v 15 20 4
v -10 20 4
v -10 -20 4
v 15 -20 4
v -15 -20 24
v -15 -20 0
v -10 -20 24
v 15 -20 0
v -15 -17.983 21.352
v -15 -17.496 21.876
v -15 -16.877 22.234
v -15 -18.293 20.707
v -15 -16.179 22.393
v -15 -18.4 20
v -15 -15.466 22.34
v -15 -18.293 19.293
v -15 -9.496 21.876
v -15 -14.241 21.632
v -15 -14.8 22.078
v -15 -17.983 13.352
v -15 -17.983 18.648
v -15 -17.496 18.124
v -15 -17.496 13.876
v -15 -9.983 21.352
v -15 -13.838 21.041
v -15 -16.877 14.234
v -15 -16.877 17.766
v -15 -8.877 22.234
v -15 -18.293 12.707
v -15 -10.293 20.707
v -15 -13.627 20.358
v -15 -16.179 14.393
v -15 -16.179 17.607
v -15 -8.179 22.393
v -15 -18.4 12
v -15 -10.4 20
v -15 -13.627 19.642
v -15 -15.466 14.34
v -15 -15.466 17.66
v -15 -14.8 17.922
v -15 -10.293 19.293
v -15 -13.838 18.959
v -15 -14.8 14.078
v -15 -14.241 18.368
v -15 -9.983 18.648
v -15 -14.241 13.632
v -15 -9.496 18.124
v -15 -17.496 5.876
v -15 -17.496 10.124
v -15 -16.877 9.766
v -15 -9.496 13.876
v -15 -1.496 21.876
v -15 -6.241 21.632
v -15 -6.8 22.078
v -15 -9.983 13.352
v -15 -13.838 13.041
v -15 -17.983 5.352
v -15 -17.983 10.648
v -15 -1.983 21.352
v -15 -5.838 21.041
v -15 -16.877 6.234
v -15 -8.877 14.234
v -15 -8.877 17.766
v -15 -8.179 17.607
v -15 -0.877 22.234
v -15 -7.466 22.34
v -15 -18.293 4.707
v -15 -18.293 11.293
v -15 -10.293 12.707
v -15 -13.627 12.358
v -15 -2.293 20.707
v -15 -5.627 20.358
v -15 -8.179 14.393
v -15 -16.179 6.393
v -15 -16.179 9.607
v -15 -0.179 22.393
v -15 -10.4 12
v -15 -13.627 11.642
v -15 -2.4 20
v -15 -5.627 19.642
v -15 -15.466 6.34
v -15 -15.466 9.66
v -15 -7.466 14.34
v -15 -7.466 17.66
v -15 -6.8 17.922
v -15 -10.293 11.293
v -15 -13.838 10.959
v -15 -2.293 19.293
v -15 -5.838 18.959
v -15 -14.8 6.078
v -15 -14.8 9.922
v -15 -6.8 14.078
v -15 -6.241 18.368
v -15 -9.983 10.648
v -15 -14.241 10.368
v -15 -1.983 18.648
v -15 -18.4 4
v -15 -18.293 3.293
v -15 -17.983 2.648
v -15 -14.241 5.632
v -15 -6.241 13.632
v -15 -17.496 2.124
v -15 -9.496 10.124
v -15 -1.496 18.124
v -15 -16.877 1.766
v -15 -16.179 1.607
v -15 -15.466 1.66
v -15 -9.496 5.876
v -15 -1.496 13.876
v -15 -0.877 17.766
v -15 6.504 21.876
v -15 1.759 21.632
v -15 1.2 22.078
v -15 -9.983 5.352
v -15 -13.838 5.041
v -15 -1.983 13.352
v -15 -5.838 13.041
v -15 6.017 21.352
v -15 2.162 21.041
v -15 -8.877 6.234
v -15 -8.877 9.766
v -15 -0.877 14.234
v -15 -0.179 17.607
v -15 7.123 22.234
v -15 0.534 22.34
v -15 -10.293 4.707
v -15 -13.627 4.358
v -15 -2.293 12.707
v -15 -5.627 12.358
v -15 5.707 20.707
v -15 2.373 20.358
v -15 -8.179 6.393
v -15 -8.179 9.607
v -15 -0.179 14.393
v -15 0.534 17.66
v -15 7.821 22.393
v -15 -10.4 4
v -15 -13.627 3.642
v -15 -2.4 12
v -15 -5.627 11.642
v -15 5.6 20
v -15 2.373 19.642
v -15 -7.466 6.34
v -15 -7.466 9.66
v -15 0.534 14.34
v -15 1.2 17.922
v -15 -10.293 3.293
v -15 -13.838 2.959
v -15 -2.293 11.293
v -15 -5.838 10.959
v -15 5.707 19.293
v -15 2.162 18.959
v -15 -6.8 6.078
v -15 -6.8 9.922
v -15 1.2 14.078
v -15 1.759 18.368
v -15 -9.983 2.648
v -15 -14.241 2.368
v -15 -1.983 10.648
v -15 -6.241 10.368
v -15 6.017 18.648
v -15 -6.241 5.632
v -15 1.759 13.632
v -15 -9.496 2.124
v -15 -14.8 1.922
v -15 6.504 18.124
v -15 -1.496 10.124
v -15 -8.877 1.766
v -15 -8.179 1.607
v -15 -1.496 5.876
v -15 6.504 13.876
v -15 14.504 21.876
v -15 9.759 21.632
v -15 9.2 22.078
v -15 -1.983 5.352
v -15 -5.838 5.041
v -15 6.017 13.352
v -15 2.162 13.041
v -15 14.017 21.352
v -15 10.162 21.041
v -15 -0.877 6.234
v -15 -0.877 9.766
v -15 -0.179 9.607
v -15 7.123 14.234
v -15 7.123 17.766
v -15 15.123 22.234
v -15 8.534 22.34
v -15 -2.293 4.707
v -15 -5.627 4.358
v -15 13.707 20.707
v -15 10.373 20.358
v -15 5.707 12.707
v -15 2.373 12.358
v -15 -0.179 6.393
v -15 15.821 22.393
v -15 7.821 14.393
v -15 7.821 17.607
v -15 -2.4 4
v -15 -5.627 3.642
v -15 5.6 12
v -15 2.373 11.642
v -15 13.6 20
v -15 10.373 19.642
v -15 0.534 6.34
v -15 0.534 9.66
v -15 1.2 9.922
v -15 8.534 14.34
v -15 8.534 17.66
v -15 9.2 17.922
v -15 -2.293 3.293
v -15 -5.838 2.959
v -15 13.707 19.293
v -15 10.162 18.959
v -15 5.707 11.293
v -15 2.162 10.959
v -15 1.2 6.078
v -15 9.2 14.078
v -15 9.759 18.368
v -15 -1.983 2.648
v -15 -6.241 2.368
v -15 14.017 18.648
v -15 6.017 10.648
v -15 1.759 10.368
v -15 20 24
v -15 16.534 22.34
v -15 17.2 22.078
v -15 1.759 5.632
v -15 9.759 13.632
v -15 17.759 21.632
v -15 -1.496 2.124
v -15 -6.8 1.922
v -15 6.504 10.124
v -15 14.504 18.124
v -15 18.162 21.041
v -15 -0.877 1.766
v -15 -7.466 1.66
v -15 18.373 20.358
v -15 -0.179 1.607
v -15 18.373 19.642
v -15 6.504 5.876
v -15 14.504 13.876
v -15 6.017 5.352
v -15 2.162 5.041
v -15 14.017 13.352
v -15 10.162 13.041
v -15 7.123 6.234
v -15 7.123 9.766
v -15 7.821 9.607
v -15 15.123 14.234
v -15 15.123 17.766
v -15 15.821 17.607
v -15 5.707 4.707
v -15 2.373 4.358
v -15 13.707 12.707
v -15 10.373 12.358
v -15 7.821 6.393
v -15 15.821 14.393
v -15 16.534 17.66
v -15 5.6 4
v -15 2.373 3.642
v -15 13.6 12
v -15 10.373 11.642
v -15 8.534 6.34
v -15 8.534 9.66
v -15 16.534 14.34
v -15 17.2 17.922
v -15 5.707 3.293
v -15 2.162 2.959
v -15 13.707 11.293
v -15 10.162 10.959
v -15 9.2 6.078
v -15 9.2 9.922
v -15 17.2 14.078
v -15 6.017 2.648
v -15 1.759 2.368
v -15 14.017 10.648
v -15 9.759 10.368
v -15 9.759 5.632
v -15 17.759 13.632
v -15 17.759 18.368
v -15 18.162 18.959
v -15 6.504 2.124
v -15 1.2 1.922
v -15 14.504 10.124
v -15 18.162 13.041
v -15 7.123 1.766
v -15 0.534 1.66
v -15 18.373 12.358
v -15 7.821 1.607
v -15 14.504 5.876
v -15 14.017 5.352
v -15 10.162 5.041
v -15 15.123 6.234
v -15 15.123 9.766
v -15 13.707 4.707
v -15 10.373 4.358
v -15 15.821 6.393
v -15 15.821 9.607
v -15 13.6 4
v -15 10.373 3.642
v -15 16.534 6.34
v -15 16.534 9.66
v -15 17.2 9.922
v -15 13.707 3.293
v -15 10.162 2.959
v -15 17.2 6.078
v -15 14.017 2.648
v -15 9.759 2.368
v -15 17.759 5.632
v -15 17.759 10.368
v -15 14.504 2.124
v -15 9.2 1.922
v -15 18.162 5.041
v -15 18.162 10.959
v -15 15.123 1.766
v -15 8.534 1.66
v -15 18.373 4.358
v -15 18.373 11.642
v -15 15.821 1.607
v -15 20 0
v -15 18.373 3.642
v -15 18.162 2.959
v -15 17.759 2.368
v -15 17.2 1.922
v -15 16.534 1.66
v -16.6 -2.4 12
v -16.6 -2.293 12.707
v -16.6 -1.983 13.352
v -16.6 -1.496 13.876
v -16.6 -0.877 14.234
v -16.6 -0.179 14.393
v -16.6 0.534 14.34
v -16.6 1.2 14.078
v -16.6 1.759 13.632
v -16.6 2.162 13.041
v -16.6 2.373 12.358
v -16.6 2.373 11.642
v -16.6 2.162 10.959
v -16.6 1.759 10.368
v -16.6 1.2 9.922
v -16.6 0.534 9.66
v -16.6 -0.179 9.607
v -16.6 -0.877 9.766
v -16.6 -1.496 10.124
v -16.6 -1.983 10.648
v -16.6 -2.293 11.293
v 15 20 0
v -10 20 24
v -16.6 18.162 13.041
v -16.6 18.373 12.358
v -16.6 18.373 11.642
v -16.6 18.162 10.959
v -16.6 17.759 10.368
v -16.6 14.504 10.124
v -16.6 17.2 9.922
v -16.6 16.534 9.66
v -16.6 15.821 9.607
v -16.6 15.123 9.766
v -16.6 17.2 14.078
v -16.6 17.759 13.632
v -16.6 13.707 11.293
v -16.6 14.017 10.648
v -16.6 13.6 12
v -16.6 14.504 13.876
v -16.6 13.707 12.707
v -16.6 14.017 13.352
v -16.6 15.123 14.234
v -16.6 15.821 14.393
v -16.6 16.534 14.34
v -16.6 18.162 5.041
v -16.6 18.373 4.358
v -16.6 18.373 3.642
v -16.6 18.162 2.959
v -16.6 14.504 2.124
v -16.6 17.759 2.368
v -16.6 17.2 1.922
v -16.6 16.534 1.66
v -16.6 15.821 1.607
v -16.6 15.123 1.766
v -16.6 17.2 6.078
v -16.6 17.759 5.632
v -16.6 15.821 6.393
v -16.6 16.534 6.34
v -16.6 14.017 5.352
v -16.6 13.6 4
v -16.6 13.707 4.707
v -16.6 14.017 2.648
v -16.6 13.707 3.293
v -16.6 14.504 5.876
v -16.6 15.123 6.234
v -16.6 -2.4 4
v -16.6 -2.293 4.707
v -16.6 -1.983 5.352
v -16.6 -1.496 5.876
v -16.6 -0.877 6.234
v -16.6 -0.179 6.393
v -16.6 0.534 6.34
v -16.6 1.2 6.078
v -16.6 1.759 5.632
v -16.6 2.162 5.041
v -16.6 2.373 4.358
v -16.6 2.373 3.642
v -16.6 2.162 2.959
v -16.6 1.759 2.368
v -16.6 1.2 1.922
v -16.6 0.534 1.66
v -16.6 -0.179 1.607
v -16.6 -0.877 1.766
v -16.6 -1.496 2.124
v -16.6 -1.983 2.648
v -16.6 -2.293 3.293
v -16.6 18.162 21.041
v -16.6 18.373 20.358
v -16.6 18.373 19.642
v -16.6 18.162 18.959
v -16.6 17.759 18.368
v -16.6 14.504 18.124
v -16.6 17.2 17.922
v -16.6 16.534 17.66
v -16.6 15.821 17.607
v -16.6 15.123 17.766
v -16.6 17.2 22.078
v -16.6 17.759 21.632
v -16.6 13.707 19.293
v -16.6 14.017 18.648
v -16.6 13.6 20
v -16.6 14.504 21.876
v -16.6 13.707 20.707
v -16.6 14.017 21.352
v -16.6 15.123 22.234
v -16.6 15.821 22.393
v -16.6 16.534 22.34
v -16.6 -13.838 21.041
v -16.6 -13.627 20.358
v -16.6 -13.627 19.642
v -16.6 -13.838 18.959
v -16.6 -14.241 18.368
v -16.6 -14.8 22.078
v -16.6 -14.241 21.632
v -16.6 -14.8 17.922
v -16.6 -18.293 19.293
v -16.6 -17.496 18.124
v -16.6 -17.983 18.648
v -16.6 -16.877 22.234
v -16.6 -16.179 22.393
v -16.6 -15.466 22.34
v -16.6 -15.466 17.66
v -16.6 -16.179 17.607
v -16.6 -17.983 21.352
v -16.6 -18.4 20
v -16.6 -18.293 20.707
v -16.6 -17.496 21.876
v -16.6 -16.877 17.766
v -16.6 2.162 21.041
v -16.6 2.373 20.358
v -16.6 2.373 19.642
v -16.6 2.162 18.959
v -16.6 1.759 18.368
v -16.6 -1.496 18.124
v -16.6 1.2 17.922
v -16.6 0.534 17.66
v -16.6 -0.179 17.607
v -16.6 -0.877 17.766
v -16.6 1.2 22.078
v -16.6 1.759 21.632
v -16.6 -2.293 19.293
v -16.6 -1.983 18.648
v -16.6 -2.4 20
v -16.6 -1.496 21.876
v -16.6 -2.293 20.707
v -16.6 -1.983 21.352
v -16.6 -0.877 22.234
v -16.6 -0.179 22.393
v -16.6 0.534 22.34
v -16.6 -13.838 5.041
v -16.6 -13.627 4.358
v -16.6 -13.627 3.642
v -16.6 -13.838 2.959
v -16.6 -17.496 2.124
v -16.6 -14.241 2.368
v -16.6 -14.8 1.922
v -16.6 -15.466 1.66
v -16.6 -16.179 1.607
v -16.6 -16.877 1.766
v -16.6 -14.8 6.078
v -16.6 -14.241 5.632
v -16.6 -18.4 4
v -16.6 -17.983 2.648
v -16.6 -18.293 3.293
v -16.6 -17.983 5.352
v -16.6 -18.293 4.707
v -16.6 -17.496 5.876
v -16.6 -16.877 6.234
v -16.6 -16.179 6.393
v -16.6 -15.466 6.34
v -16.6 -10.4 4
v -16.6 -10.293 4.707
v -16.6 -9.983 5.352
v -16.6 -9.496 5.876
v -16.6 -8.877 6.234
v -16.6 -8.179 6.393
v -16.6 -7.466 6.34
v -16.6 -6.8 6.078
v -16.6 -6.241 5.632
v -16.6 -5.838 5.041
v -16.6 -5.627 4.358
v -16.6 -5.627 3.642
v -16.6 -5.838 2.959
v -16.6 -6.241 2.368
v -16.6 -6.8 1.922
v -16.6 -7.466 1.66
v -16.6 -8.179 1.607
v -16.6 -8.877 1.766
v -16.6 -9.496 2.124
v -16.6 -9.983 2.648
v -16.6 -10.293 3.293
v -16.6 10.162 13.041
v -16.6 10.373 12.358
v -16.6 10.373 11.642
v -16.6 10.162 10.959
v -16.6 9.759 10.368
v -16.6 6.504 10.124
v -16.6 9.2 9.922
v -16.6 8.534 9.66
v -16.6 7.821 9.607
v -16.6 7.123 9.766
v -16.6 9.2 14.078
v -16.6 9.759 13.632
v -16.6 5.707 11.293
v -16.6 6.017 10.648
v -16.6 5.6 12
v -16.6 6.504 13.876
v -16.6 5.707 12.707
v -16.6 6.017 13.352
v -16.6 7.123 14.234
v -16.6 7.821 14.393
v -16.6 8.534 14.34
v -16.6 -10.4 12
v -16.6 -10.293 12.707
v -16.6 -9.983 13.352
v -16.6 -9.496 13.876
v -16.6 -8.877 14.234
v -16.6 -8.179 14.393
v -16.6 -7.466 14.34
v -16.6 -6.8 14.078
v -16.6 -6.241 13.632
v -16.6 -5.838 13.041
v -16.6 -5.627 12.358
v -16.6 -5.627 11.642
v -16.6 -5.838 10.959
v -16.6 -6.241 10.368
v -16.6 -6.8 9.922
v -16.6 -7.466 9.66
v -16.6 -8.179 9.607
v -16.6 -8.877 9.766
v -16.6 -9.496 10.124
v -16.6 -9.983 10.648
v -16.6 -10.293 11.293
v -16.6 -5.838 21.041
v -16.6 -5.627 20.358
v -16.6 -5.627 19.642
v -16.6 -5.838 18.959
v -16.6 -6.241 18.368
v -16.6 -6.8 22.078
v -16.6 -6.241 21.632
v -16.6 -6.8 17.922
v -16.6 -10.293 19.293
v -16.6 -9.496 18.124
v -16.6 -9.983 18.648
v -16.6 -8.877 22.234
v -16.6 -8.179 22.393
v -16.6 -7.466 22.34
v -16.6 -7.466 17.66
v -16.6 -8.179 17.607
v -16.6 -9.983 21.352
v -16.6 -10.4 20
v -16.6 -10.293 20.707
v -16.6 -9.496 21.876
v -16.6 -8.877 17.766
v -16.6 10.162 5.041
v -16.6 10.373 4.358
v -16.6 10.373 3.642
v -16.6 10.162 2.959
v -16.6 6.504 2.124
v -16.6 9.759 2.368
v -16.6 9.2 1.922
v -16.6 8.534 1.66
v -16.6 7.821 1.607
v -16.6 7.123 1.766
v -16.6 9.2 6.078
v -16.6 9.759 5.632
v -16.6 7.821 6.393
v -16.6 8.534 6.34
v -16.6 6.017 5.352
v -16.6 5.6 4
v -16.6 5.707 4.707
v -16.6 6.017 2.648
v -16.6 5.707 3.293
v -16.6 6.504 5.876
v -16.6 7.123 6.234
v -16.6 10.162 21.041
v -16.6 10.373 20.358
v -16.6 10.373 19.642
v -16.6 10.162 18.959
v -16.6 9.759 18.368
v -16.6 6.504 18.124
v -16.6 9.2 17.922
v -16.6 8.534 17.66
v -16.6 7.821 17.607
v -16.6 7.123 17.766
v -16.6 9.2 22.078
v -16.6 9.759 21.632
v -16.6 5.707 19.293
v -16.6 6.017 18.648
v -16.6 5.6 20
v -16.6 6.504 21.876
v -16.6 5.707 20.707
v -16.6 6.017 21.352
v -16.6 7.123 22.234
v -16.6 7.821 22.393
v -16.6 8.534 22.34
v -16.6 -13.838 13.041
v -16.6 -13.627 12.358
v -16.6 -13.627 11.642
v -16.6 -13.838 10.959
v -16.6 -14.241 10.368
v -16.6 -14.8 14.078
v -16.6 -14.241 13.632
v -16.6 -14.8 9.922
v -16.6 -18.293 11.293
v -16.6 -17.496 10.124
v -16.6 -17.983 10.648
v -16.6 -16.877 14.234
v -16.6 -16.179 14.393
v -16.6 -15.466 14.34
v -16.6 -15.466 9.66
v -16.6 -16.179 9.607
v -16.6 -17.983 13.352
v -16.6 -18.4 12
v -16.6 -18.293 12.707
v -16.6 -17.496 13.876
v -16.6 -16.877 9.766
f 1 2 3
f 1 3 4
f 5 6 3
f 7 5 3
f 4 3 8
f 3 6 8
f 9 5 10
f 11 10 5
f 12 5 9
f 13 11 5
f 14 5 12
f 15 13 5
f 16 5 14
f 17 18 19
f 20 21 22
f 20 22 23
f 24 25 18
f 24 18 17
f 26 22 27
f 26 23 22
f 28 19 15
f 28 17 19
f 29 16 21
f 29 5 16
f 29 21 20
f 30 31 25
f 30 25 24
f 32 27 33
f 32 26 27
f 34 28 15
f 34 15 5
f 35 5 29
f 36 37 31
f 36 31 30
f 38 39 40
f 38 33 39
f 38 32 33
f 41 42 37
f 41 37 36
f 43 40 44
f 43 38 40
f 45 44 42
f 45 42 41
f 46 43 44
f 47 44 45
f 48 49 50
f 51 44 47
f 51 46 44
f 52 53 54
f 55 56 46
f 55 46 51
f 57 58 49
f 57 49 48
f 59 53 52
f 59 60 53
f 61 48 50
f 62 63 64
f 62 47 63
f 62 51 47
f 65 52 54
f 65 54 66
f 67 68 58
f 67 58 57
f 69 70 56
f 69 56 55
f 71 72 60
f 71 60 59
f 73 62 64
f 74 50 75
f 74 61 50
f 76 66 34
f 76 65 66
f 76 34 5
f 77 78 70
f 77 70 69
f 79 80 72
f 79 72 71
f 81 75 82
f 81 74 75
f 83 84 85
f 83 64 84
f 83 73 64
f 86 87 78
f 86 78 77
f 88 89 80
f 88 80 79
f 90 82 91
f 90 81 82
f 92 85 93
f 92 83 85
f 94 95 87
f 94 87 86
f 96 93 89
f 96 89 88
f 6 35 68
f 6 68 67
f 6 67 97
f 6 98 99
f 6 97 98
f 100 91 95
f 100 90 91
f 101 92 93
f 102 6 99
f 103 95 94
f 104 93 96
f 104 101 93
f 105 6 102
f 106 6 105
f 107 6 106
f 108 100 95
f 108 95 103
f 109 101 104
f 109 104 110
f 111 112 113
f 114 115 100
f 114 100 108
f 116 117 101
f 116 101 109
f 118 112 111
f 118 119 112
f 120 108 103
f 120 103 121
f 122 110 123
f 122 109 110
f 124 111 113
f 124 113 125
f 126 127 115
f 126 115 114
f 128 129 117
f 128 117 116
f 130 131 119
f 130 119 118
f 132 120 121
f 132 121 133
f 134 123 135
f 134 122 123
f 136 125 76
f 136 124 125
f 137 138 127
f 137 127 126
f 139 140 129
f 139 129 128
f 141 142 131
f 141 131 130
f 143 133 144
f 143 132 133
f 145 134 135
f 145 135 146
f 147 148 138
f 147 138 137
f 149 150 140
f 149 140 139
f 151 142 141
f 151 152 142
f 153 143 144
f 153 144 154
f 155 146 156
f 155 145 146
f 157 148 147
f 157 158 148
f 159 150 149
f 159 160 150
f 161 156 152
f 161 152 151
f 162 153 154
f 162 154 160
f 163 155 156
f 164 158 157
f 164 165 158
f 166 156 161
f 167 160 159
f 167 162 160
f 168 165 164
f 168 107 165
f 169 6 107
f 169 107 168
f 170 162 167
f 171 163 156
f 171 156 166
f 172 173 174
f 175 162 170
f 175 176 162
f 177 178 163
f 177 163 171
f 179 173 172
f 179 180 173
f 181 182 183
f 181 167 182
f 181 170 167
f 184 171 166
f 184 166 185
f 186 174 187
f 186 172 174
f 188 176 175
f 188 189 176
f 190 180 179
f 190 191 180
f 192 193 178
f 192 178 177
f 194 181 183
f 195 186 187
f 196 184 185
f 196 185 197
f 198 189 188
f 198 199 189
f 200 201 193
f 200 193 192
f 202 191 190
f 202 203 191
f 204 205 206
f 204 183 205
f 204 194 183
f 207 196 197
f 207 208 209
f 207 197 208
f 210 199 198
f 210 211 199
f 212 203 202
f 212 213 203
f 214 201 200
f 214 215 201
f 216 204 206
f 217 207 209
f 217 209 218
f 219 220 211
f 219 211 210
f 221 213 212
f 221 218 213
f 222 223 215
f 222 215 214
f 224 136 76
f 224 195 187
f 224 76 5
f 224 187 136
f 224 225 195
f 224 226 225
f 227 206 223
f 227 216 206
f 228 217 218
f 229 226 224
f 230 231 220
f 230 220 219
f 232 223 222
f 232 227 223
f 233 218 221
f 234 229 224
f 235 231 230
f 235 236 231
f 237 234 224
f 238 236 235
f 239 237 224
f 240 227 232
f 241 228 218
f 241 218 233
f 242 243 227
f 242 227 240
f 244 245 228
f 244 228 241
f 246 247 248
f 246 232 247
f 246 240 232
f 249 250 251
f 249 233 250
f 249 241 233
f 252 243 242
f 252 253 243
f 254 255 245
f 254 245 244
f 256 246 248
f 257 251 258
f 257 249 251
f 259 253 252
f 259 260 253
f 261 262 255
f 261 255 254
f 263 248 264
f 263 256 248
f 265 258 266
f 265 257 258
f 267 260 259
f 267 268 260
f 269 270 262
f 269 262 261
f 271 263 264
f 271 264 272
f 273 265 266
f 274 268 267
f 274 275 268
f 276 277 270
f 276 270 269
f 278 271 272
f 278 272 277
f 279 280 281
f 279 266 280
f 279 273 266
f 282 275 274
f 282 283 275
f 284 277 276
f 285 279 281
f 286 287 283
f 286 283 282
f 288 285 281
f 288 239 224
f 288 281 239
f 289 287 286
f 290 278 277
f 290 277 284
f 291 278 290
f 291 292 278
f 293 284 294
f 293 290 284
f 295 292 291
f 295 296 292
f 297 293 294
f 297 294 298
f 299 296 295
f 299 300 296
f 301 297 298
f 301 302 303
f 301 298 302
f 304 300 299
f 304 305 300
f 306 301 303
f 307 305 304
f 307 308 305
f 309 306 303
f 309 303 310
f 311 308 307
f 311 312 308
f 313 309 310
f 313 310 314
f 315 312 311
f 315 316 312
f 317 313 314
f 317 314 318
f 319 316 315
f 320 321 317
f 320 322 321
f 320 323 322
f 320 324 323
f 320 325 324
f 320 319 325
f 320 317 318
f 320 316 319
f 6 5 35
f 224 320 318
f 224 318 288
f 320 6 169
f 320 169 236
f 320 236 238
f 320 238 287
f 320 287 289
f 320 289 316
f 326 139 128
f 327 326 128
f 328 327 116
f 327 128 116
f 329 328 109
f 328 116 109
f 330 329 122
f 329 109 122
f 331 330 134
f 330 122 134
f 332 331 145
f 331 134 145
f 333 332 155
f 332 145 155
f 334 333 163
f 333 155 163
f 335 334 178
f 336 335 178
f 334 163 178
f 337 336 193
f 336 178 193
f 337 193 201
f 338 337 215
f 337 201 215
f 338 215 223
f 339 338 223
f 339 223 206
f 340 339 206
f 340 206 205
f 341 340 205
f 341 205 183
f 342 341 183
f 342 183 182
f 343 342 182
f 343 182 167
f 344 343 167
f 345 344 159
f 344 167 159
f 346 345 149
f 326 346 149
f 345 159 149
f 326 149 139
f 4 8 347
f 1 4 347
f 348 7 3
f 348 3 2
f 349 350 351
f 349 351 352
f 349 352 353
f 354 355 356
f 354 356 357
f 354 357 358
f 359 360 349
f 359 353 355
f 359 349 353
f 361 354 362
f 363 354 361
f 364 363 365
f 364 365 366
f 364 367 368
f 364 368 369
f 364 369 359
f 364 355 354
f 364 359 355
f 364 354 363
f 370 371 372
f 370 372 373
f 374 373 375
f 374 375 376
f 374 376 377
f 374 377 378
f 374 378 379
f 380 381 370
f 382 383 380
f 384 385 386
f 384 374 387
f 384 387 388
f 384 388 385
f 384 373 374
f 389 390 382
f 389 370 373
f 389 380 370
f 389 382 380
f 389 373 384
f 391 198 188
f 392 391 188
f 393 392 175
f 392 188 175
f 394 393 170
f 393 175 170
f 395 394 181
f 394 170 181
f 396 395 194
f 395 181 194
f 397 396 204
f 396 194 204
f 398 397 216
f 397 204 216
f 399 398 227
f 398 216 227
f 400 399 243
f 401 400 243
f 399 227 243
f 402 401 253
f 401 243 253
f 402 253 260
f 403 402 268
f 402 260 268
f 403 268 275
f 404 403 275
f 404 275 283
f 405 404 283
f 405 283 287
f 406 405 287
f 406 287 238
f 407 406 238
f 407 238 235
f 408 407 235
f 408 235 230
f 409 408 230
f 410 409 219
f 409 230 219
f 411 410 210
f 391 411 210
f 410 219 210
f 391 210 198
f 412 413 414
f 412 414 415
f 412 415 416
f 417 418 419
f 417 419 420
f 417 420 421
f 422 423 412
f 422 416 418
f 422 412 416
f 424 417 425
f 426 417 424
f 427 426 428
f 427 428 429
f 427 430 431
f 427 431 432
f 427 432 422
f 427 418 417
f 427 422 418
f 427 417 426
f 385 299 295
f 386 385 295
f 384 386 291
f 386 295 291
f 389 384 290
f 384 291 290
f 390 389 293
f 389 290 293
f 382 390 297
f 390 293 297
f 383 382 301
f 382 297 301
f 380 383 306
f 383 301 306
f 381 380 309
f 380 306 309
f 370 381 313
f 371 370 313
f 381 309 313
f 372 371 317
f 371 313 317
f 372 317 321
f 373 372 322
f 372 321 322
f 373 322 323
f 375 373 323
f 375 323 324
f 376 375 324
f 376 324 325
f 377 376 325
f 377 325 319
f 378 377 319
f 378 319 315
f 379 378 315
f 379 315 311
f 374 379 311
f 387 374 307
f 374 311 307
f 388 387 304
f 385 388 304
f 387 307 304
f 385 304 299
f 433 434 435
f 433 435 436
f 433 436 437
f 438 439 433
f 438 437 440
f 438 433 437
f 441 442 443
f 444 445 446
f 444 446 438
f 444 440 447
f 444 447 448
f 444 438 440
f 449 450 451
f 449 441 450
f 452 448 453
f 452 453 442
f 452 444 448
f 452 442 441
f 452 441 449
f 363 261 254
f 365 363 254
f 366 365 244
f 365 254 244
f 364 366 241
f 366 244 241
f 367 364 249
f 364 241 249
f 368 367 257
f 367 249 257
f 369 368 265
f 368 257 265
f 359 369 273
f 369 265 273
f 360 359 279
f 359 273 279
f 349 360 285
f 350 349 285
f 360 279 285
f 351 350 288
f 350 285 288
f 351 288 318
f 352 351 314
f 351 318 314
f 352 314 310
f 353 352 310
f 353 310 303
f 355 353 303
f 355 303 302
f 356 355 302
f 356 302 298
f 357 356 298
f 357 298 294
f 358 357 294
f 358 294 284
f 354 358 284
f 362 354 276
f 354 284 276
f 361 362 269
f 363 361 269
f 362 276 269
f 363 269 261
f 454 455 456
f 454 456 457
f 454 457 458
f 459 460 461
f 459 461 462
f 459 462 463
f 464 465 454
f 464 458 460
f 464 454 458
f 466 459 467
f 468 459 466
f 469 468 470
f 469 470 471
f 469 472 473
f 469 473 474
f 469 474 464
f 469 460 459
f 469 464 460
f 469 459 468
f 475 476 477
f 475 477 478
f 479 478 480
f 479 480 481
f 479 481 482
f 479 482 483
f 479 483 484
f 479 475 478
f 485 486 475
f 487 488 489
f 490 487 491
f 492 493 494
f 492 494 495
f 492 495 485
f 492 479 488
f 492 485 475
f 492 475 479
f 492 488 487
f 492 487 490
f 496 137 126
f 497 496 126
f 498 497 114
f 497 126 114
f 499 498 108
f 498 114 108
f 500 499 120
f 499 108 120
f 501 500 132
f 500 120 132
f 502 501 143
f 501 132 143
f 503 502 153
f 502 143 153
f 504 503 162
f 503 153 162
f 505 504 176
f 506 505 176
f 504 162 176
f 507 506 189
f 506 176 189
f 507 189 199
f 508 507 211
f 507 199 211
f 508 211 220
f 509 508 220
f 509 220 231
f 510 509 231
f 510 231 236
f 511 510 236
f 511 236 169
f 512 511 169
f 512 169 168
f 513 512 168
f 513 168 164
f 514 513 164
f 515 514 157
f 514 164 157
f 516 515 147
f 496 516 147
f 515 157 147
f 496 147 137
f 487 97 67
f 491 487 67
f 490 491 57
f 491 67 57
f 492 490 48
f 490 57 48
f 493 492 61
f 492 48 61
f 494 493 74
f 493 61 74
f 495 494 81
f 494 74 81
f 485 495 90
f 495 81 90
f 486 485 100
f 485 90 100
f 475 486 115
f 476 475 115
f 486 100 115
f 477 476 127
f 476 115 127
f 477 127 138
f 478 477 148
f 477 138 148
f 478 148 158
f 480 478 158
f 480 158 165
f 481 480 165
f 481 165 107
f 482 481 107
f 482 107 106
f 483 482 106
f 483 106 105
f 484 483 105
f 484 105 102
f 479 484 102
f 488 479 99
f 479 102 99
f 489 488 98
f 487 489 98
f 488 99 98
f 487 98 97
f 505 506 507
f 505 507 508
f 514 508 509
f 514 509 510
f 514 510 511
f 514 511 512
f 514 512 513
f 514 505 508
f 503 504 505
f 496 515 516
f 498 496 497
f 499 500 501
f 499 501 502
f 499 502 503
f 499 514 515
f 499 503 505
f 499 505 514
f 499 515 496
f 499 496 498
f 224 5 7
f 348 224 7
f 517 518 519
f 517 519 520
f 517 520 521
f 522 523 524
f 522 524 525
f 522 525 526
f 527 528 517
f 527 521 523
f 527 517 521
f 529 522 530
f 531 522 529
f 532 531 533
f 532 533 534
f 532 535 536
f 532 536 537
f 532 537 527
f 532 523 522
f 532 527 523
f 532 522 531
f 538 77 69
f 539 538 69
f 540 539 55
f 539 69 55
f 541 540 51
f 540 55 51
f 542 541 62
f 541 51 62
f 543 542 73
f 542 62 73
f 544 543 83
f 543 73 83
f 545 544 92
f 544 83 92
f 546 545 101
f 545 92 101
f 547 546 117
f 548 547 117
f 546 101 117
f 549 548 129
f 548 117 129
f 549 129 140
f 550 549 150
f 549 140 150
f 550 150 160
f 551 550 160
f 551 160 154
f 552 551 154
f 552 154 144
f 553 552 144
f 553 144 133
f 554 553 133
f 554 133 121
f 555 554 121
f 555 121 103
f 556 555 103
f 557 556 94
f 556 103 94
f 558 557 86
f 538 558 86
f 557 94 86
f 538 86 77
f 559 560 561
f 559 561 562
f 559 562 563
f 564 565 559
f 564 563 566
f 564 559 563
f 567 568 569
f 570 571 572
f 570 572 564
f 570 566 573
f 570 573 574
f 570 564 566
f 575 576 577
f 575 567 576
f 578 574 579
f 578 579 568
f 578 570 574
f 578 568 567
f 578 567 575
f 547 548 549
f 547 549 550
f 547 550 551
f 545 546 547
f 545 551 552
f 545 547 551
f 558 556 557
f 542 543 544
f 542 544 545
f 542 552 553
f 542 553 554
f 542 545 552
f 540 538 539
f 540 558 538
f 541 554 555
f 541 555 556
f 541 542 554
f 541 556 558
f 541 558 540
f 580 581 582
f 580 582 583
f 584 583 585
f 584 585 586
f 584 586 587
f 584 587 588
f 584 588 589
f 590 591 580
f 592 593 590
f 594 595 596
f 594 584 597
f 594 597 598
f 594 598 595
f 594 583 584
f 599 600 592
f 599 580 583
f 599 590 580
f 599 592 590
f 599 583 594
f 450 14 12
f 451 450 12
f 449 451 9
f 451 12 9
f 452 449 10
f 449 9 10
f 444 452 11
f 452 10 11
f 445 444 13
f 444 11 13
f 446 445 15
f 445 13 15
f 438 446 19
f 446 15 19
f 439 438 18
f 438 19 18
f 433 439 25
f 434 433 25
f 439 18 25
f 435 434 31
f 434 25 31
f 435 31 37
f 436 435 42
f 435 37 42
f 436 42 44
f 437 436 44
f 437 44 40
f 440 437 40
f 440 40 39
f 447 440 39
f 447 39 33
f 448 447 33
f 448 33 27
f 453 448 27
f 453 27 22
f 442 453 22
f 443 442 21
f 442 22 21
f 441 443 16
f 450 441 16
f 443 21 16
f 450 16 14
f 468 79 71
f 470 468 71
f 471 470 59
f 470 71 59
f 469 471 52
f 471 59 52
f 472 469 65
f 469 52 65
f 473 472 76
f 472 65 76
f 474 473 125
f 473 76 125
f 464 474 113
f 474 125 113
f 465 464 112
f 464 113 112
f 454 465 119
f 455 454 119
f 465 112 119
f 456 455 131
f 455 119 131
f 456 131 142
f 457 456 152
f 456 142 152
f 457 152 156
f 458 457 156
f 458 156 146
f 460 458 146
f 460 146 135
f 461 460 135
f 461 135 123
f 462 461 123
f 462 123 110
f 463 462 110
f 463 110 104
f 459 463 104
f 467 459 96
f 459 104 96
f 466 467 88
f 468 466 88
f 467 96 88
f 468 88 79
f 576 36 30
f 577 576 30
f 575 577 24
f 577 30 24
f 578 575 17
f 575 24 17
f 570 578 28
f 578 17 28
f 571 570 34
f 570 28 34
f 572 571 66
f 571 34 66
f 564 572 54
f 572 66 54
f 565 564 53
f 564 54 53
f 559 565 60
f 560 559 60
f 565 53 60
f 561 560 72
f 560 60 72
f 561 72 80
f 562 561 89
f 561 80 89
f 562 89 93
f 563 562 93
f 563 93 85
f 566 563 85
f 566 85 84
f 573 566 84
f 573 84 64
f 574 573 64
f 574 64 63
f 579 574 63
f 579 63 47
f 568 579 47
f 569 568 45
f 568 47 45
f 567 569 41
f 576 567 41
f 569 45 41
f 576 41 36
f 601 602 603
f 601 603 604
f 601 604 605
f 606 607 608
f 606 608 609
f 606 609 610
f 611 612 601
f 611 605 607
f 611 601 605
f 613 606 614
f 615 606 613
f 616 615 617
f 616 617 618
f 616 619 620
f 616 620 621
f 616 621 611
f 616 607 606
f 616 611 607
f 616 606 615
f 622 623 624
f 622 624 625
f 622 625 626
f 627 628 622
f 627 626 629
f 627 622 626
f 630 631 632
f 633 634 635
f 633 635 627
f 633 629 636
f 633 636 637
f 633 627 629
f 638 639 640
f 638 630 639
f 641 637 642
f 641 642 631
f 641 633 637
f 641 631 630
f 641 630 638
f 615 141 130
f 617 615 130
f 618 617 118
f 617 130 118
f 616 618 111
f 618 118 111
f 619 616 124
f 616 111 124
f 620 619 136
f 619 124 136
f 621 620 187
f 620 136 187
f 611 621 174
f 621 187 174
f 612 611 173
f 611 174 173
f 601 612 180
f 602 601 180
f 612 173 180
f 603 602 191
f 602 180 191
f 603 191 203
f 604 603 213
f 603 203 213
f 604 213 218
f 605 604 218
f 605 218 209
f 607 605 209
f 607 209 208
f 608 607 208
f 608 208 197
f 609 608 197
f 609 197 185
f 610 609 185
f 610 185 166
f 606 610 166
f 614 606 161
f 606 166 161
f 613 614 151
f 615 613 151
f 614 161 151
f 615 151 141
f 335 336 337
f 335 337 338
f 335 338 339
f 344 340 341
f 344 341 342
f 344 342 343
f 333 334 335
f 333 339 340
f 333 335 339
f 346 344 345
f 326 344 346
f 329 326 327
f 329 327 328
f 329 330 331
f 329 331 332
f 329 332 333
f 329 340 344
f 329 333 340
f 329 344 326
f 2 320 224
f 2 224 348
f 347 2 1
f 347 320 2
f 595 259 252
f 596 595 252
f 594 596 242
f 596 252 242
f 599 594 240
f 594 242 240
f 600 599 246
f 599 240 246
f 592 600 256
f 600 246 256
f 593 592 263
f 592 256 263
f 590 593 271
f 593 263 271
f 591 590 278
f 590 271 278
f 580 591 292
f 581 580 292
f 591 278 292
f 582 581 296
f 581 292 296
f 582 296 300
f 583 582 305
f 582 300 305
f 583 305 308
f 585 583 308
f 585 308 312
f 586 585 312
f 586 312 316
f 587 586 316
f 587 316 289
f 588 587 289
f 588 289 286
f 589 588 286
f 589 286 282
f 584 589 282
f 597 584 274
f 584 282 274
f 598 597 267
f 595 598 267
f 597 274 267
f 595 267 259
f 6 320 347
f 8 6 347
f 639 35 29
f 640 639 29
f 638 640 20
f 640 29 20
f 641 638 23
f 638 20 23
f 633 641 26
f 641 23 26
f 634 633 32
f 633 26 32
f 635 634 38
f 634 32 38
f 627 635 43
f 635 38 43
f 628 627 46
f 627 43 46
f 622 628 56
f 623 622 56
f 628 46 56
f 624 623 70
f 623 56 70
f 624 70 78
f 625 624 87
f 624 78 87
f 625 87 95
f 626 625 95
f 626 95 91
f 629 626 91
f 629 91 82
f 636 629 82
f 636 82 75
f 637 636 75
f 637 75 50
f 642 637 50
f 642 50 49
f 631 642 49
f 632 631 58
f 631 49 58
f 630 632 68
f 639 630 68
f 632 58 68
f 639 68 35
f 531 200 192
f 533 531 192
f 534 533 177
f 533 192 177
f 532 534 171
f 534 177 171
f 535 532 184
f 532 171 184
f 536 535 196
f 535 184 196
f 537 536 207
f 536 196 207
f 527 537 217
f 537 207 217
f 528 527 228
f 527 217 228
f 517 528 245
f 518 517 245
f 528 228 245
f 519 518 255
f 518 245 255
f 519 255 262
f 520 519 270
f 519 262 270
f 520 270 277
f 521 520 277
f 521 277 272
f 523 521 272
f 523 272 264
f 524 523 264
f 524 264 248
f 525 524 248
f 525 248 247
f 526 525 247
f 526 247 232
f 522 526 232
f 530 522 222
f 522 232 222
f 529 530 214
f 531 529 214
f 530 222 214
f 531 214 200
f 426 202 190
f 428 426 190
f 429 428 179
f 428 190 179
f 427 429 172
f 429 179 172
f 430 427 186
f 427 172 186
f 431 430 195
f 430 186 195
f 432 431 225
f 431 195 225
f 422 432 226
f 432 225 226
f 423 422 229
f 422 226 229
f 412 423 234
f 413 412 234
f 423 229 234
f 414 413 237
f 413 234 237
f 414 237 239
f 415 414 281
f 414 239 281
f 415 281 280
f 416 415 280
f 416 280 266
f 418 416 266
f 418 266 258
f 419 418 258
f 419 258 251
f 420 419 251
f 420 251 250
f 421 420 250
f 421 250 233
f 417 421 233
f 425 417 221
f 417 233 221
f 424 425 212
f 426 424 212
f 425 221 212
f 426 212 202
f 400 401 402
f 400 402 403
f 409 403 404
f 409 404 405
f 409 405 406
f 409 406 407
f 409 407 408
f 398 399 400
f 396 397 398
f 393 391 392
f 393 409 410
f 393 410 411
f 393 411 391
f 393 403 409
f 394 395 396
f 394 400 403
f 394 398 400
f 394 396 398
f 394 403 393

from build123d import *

# Parameters (mm, degrees)
F0_W     = 30
F0_H     = 40
F1_DEPTH = 24
F2_W     = 25
F2_H     = 40
F3_DEPTH = 20
F4_R     = 2.4
F5_DEPTH = 1.6


with BuildPart() as f1:
    # F0 (on Top) → F1 (new body)
    with BuildSketch(Plane.XY):
        Rectangle(F0_W, F0_H)
    extrude(amount=F1_DEPTH)

    # F2 (on face) → F3 (cut)
    with BuildSketch(Plane.XY.offset(24)):
        with Locations((2.5, 0)):
            Rectangle(F2_W, F2_H)
    extrude(amount=-F3_DEPTH, mode=Mode.SUBTRACT)

    # F4 (on face) → F5 (join)
    with BuildSketch(Plane(origin=(-15, 0, 0), x_dir=(0, -1, 0), z_dir=(-1, 0, 0))):
        with Locations((-16, 4)):
            Circle(F4_R)
        with Locations((-16, 12)):
            Circle(F4_R)
        with Locations((-16, 20)):
            Circle(F4_R)
        with Locations((-8, 4)):
            Circle(F4_R)
        with Locations((-8, 12)):
            Circle(F4_R)
        with Locations((-8, 20)):
            Circle(F4_R)
        with Locations((0, 4)):
            Circle(F4_R)
        with Locations((0, 12)):
            Circle(F4_R)
        with Locations((0, 20)):
            Circle(F4_R)
        with Locations((8, 4)):
            Circle(F4_R)
        with Locations((8, 12)):
            Circle(F4_R)
        with Locations((8, 20)):
            Circle(F4_R)
        with Locations((16, 4)):
            Circle(F4_R)
        with Locations((16, 12)):
            Circle(F4_R)
        with Locations((16, 20)):
            Circle(F4_R)
    extrude(amount=F5_DEPTH)


solid = f1.part
